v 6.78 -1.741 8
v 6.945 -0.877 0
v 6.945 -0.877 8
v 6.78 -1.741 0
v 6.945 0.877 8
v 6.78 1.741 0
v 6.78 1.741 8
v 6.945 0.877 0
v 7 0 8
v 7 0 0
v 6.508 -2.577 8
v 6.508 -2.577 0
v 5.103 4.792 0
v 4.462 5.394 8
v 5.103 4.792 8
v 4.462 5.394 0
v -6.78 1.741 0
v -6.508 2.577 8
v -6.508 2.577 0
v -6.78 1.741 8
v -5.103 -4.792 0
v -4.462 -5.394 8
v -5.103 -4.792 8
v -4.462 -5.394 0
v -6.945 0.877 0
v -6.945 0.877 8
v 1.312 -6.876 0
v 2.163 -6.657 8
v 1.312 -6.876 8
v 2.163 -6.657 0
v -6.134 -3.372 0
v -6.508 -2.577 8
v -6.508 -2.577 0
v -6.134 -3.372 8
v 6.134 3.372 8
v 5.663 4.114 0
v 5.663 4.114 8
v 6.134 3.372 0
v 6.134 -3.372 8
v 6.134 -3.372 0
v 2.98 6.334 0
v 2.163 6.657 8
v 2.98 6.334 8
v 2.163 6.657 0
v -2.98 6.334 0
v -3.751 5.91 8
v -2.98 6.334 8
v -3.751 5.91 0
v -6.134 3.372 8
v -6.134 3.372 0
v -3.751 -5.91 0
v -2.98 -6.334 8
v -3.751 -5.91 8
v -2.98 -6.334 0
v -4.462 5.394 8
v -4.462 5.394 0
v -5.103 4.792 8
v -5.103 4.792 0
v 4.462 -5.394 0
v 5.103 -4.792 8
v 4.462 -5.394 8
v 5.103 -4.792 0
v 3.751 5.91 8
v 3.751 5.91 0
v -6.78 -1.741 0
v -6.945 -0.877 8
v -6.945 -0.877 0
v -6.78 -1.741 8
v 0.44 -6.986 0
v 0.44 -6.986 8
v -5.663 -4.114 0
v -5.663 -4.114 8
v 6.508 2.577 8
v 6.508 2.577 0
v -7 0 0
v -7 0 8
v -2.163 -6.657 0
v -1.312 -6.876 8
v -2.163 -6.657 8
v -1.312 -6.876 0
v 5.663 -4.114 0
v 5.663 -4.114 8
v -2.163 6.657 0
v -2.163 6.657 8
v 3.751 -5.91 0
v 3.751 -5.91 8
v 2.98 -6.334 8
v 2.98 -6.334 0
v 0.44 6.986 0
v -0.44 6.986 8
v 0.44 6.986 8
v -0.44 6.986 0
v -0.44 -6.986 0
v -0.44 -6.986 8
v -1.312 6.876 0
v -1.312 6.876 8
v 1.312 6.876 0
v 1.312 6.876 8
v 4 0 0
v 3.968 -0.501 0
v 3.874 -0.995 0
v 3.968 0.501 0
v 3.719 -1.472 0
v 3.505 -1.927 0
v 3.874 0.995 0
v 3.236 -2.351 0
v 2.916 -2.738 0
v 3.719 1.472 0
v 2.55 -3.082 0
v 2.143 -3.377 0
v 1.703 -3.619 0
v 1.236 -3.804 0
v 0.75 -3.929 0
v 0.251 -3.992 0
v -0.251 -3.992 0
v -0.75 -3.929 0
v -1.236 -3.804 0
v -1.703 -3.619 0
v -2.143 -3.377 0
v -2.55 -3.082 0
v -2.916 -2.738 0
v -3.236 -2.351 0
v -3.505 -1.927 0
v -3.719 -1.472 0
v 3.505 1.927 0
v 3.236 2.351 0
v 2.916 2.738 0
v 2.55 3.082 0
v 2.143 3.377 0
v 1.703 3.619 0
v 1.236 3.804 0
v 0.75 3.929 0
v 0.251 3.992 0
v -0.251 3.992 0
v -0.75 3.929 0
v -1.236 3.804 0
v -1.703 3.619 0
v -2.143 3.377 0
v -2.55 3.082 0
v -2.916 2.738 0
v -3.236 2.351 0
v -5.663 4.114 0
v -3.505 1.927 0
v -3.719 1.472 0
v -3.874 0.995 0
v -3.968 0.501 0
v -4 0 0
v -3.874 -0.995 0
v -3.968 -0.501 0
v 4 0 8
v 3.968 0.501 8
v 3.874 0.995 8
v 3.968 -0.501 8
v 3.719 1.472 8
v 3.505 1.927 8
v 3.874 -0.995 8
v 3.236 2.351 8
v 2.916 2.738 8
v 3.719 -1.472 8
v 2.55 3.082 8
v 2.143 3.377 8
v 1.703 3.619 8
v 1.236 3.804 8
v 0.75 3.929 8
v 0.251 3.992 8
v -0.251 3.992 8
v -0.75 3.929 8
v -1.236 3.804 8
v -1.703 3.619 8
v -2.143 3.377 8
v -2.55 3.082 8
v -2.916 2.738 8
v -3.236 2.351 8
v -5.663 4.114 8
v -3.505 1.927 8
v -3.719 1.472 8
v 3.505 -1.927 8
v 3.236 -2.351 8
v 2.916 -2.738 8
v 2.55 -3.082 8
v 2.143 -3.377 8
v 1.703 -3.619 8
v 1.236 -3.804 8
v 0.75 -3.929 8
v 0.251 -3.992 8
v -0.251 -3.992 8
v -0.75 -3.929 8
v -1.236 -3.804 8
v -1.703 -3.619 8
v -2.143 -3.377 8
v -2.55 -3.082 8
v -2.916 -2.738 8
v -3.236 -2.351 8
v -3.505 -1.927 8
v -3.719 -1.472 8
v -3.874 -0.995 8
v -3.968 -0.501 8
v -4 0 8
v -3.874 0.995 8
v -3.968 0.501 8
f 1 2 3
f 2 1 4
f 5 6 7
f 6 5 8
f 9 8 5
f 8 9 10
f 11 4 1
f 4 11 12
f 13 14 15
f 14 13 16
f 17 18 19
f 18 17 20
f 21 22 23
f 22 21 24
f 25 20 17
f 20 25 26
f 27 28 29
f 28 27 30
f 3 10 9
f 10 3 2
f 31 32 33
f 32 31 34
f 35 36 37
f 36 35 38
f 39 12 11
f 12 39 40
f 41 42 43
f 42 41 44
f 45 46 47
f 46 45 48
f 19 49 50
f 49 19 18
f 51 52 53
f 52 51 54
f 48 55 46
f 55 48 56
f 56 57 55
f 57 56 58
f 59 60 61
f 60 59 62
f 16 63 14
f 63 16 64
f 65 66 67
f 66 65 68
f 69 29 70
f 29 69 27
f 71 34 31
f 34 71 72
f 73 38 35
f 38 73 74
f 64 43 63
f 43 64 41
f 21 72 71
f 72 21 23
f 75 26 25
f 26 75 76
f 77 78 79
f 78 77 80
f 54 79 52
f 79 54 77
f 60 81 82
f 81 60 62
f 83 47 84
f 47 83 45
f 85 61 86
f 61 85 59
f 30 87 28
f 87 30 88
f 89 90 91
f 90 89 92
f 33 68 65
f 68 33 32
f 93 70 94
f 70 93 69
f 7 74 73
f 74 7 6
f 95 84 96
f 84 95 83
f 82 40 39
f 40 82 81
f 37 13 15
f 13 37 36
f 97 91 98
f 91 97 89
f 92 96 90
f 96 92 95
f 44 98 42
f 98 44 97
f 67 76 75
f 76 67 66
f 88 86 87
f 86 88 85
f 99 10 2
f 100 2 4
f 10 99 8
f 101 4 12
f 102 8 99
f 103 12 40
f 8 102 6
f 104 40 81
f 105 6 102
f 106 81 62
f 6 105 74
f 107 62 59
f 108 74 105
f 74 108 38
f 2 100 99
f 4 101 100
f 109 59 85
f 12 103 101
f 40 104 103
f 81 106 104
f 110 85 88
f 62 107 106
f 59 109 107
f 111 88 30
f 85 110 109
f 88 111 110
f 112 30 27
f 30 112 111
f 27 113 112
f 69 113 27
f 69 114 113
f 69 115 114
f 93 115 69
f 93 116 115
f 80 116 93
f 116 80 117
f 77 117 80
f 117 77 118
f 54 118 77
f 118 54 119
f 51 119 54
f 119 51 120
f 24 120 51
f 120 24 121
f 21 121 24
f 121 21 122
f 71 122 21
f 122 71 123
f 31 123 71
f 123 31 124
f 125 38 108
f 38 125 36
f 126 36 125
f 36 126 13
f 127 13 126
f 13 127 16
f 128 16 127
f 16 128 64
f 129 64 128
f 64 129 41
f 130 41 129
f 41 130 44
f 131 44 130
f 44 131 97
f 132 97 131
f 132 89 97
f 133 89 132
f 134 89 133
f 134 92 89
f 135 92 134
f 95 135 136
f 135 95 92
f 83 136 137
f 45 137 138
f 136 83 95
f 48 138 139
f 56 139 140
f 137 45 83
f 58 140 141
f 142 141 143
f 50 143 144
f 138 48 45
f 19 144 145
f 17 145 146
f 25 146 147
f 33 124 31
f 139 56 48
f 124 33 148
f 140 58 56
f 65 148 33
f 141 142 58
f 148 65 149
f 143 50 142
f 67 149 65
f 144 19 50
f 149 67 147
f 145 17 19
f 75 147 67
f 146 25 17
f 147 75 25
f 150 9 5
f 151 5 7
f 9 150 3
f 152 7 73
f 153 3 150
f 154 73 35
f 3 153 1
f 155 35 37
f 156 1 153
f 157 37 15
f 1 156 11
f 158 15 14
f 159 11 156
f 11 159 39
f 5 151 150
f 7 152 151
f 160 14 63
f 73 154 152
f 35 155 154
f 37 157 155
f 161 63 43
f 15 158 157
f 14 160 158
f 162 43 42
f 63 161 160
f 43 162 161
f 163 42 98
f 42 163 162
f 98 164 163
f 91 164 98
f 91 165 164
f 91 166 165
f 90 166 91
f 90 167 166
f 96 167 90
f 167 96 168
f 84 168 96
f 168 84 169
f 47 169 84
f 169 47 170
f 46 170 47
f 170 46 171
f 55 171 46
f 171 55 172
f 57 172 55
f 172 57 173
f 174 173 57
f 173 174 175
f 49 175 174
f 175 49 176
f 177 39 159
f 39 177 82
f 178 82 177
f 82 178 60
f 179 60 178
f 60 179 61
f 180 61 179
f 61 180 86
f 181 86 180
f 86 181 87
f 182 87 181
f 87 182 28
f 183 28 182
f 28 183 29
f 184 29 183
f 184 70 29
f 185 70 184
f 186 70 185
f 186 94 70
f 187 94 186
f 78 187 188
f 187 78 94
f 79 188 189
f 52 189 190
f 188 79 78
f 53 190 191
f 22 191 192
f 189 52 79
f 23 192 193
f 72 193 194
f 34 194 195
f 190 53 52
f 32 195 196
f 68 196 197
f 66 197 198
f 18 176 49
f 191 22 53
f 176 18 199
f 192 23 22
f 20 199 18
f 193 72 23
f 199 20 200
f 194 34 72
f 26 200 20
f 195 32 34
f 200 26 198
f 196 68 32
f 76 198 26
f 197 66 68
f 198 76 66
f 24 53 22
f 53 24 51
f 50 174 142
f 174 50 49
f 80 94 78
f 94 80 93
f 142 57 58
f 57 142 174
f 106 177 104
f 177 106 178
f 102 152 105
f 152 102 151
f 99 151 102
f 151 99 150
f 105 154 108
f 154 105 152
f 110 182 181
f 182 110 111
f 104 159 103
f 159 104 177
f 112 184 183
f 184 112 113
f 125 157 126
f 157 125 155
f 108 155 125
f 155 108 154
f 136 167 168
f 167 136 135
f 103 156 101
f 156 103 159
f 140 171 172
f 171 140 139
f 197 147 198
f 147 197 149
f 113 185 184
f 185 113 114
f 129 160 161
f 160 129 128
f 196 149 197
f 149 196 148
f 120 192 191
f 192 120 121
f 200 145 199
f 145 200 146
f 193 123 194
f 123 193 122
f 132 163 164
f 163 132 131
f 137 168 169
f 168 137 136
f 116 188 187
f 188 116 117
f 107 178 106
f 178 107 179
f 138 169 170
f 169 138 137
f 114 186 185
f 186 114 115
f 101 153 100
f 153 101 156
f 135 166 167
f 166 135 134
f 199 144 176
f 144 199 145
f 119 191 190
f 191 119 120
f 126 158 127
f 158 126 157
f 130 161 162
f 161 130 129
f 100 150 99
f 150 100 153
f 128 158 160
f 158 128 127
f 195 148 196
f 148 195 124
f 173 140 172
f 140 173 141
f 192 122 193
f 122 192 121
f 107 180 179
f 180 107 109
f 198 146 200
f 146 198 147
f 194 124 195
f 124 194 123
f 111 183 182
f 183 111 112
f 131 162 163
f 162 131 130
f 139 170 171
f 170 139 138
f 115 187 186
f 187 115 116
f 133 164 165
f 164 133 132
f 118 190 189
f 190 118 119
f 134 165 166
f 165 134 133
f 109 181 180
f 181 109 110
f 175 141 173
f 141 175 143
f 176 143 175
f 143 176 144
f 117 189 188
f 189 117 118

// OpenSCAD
// file: tolerance.scad
// Author: Mihai Oltean, https://mihaioltean.github.io, mihai.oltean@gmail.com
// More details: jenny5.org
// Source: github.com/jenny5-robot
// MIT License
//--------------------------------------------------------------

tolerance = 0.1;
display_tolerance = 1;

overlap_tolerance = 0.01;

tolerance_z = [0, 0, tolerance];
tolerance_x = [tolerance, 0, 0];
tolerance_y = [0, tolerance, 0];

display_tolerance_z = [0, 0, display_tolerance];
display_tolerance_x = [display_tolerance, 0, 0];
display_tolerance_y = [0, display_tolerance, 0];

display_tolerance_xz = [display_tolerance, 0, display_tolerance];
display_tolerance_xy = [display_tolerance, display_tolerance, 0];
display_tolerance_yz = [0, display_tolerance, display_tolerance];

display_tolerance_xyz = [display_tolerance, display_tolerance, display_tolerance];
// file: params_screws_nuts_washers.scad
// Author: Mihai Oltean, www.tcreate.org, mihai.oltean@gmail.com
// More details: jenny5.org
// Source: github.com/jenny5-robot
// MIT License
//--------------------------------------------------------------


m2_screw_radius = 1;
m2_nut_radius = 2.2;
m2_nut_height = 1.6;
m2_nut_thick = m2_nut_height;

m3_screw_radius = 1.5;
m3_nut_radius = 3.1;
m3_nut_height = 2.3;
m3_nut_thick = m3_nut_height;
m3_autolock_nut_thick = 4.2;

m4_screw_radius = 2;
m4_nut_radius = 4;
m4_auto_lock_nut_height = 5;
m4_nut_height = 3.25;
m4_nut_thick = 3.25;

m5_screw_radius = 2.5;
m5_nut_radius = 4.6;
m5_nut_height = 4;

m6_screw_radius = 3;
m6_nut_radius = 5.65;
m6_nut_thick = 5;
m6_nut_slim_thick = 3;
m6_autolock_nut_thick = 6;
m6_long_nut_thick = 9;

m8_screw_head_height = 5.7;
m8_screw_radius = 3.9;
m8_nut_small_width = 12.8;
m8_nut_radius = 7.3;
m8_slim_nut_small_width = 12.4;
m8_nut_thick = 6.5;
m8_nut_height = m8_nut_thick;
m8_slim_nut_height = 5.5;
m8_screw_head_radius = 6.5;
m8_autolock_nut_thick = 8;

m10_screw_radius = 5;
m10_nut_thick = 8;
m10_nut_radius = 9.8;

M12_screw_radius = 6;
M12_nut_thick = 10;
M12_nut_radius = 11;
M12_long_long_nut_thick = 36;
M12_long_nut_thick = 36;
M12_autolock_nut_thick = 14;

m10_long_nut_radius = 9.71;
m10_long_nut_height = 29.8;

m10_long_thick_nut_radius = 7.41;
m10_long_thick_nut_height = 30.4;

m12_plastic_nut_radius = 10.45;
m12_plastic_nut_height = 23.3;

tr12_3_nut_radius = 11;
tr12_3_nut_height = 18.1;

washer_5 = 0.97;

washer_4_12_radius = 6;
washer_4_12_external_radius = 6;
washer_4_12_thick = 1;
washer_4_thick = 1;
washer_4_12_internal_radius = 2.15;

washer_4_9_external_radius = 4.5;
washer_4_9_internal_radius = 2.15;
washer_4_9_thick = 1;

washer_6_thick = 1.7;
washer_8_thick = 1.5;
washer_5_thick = 1;

washer_10_height = 2;
washer_10_thick = 2;

washer_12_thick = 2;

washer_5_15_external_radius = 7.5;
washer_5_15_thick = 1;
washer_5_thick = 1;
washer_5_15_internal_radius = 2.65;
// file: params_basic_components.scad
// Author: Mihai Oltean, https://mihaioltean.github.io, mihai.oltean@gmail.com
// More details: jenny5.org
// Source: github.com/jenny5-robot
// MIT License
//--------------------------------------------------------------

spring_length = 20;

smooth_rod_8_radius = 4;
smooth_rod_10_radius = 5;
smooth_rod_12_radius = 6;

wall_thick_1 = 1;
wall_thick_2 = 2;
wall_thick_3 = 3;
wall_thick_4 = 4;
wall_thick_5 = 5;
wall_thick_5_5 = 5.5;
wall_thick_6 = 6;
wall_thick_7 = 7;
wall_thick_8 = 8;
wall_thick_9 = 9;
wall_thick_10 = 10;
wall_thick_12 = 12;
// main file
// Author: Mihai Oltean, www.tcreate.org, mihai.oltean@gmail.com
// More details: jenny5.org
// Source: github.com/jenny5-robot
// MIT License
//--------------------------------------------------------------

include <params_basic_components.scad>
include <params_screws_nuts_washers.scad>
include <tolerance.scad>

//-------------------------------------------------------------
module ring_with_flanges(external_radius, internal_radius, height, flange_size = 1.5)
{
    
  difference(){
      union(){
    cylinder(h = height, r = external_radius, $fn = 50);
          // flanges
          cylinder(h = flange_size, r2 = external_radius, r1= external_radius + flange_size , $fn = 50);
          translate ([0, 0, height - flange_size])cylinder(h = flange_size, r1 = external_radius, r2= external_radius + flange_size , $fn = 50);
      }
    translate (-display_tolerance_z) cylinder(h = height + 2 * display_tolerance, r = internal_radius, $fn = 50);
  }
}
//-------------------------------------------------------------
module ring_with_flanges_and_rectangular_hole(external_radius, internal_edge_length, height)
{
  flange_size = 1.5;
  difference(){
    union(){
      cylinder(h = height, r = external_radius, $fn = 50);
          // flanges
      cylinder(h = flange_size, r2 = external_radius, r1= external_radius + flange_size , $fn = 50);
      translate ([0, 0, height - flange_size])cylinder(h = flange_size, r1 = external_radius, r2= external_radius + flange_size , $fn = 50);
    }
    translate ([-internal_edge_length / 2, -internal_edge_length / 2, 0]-display_tolerance_z) cube([internal_edge_length, internal_edge_length, height] + 2 * display_tolerance_z);
      // m3 screw hole
    translate ([0, 0, height / 2]) rotate([0, 90, 0]) cylinder (h = external_radius, r = 1.4, $fn = 30);  
    // m3 nut hole
    translate ([internal_edge_length / 2, 0, height / 2]) rotate([0, 90, 0]) cylinder (h = 2.5, r = m3_nut_radius, $fn = 6);  
  }
}
//-------------------------------------------------------------
module potentiometer_button()
{
  difference(){
    ring_with_flanges(10, 3.3, 8);
      translate ([-6.3, -0.5, 0]) cube([12.6, 1, 1]);
    translate ([-6.3, 0, 0] - display_tolerance_z) cylinder (r = 0.5, h = 10, $fn = 20);
    translate ([6.3, 0, 0] - display_tolerance_z) cylinder (r = 0.5, h = 10, $fn = 20);
  }
}
//-------------------------------------------------------------

//ring_with_flanges(7, 4, 7);

//ring_with_flanges(10, 6.6, 12);

ring_with_flanges(7, 4, 8, 0);

//ring_with_flanges_and_rectangular_hole(10, 10.5, 9);

//potentiometer_button();
